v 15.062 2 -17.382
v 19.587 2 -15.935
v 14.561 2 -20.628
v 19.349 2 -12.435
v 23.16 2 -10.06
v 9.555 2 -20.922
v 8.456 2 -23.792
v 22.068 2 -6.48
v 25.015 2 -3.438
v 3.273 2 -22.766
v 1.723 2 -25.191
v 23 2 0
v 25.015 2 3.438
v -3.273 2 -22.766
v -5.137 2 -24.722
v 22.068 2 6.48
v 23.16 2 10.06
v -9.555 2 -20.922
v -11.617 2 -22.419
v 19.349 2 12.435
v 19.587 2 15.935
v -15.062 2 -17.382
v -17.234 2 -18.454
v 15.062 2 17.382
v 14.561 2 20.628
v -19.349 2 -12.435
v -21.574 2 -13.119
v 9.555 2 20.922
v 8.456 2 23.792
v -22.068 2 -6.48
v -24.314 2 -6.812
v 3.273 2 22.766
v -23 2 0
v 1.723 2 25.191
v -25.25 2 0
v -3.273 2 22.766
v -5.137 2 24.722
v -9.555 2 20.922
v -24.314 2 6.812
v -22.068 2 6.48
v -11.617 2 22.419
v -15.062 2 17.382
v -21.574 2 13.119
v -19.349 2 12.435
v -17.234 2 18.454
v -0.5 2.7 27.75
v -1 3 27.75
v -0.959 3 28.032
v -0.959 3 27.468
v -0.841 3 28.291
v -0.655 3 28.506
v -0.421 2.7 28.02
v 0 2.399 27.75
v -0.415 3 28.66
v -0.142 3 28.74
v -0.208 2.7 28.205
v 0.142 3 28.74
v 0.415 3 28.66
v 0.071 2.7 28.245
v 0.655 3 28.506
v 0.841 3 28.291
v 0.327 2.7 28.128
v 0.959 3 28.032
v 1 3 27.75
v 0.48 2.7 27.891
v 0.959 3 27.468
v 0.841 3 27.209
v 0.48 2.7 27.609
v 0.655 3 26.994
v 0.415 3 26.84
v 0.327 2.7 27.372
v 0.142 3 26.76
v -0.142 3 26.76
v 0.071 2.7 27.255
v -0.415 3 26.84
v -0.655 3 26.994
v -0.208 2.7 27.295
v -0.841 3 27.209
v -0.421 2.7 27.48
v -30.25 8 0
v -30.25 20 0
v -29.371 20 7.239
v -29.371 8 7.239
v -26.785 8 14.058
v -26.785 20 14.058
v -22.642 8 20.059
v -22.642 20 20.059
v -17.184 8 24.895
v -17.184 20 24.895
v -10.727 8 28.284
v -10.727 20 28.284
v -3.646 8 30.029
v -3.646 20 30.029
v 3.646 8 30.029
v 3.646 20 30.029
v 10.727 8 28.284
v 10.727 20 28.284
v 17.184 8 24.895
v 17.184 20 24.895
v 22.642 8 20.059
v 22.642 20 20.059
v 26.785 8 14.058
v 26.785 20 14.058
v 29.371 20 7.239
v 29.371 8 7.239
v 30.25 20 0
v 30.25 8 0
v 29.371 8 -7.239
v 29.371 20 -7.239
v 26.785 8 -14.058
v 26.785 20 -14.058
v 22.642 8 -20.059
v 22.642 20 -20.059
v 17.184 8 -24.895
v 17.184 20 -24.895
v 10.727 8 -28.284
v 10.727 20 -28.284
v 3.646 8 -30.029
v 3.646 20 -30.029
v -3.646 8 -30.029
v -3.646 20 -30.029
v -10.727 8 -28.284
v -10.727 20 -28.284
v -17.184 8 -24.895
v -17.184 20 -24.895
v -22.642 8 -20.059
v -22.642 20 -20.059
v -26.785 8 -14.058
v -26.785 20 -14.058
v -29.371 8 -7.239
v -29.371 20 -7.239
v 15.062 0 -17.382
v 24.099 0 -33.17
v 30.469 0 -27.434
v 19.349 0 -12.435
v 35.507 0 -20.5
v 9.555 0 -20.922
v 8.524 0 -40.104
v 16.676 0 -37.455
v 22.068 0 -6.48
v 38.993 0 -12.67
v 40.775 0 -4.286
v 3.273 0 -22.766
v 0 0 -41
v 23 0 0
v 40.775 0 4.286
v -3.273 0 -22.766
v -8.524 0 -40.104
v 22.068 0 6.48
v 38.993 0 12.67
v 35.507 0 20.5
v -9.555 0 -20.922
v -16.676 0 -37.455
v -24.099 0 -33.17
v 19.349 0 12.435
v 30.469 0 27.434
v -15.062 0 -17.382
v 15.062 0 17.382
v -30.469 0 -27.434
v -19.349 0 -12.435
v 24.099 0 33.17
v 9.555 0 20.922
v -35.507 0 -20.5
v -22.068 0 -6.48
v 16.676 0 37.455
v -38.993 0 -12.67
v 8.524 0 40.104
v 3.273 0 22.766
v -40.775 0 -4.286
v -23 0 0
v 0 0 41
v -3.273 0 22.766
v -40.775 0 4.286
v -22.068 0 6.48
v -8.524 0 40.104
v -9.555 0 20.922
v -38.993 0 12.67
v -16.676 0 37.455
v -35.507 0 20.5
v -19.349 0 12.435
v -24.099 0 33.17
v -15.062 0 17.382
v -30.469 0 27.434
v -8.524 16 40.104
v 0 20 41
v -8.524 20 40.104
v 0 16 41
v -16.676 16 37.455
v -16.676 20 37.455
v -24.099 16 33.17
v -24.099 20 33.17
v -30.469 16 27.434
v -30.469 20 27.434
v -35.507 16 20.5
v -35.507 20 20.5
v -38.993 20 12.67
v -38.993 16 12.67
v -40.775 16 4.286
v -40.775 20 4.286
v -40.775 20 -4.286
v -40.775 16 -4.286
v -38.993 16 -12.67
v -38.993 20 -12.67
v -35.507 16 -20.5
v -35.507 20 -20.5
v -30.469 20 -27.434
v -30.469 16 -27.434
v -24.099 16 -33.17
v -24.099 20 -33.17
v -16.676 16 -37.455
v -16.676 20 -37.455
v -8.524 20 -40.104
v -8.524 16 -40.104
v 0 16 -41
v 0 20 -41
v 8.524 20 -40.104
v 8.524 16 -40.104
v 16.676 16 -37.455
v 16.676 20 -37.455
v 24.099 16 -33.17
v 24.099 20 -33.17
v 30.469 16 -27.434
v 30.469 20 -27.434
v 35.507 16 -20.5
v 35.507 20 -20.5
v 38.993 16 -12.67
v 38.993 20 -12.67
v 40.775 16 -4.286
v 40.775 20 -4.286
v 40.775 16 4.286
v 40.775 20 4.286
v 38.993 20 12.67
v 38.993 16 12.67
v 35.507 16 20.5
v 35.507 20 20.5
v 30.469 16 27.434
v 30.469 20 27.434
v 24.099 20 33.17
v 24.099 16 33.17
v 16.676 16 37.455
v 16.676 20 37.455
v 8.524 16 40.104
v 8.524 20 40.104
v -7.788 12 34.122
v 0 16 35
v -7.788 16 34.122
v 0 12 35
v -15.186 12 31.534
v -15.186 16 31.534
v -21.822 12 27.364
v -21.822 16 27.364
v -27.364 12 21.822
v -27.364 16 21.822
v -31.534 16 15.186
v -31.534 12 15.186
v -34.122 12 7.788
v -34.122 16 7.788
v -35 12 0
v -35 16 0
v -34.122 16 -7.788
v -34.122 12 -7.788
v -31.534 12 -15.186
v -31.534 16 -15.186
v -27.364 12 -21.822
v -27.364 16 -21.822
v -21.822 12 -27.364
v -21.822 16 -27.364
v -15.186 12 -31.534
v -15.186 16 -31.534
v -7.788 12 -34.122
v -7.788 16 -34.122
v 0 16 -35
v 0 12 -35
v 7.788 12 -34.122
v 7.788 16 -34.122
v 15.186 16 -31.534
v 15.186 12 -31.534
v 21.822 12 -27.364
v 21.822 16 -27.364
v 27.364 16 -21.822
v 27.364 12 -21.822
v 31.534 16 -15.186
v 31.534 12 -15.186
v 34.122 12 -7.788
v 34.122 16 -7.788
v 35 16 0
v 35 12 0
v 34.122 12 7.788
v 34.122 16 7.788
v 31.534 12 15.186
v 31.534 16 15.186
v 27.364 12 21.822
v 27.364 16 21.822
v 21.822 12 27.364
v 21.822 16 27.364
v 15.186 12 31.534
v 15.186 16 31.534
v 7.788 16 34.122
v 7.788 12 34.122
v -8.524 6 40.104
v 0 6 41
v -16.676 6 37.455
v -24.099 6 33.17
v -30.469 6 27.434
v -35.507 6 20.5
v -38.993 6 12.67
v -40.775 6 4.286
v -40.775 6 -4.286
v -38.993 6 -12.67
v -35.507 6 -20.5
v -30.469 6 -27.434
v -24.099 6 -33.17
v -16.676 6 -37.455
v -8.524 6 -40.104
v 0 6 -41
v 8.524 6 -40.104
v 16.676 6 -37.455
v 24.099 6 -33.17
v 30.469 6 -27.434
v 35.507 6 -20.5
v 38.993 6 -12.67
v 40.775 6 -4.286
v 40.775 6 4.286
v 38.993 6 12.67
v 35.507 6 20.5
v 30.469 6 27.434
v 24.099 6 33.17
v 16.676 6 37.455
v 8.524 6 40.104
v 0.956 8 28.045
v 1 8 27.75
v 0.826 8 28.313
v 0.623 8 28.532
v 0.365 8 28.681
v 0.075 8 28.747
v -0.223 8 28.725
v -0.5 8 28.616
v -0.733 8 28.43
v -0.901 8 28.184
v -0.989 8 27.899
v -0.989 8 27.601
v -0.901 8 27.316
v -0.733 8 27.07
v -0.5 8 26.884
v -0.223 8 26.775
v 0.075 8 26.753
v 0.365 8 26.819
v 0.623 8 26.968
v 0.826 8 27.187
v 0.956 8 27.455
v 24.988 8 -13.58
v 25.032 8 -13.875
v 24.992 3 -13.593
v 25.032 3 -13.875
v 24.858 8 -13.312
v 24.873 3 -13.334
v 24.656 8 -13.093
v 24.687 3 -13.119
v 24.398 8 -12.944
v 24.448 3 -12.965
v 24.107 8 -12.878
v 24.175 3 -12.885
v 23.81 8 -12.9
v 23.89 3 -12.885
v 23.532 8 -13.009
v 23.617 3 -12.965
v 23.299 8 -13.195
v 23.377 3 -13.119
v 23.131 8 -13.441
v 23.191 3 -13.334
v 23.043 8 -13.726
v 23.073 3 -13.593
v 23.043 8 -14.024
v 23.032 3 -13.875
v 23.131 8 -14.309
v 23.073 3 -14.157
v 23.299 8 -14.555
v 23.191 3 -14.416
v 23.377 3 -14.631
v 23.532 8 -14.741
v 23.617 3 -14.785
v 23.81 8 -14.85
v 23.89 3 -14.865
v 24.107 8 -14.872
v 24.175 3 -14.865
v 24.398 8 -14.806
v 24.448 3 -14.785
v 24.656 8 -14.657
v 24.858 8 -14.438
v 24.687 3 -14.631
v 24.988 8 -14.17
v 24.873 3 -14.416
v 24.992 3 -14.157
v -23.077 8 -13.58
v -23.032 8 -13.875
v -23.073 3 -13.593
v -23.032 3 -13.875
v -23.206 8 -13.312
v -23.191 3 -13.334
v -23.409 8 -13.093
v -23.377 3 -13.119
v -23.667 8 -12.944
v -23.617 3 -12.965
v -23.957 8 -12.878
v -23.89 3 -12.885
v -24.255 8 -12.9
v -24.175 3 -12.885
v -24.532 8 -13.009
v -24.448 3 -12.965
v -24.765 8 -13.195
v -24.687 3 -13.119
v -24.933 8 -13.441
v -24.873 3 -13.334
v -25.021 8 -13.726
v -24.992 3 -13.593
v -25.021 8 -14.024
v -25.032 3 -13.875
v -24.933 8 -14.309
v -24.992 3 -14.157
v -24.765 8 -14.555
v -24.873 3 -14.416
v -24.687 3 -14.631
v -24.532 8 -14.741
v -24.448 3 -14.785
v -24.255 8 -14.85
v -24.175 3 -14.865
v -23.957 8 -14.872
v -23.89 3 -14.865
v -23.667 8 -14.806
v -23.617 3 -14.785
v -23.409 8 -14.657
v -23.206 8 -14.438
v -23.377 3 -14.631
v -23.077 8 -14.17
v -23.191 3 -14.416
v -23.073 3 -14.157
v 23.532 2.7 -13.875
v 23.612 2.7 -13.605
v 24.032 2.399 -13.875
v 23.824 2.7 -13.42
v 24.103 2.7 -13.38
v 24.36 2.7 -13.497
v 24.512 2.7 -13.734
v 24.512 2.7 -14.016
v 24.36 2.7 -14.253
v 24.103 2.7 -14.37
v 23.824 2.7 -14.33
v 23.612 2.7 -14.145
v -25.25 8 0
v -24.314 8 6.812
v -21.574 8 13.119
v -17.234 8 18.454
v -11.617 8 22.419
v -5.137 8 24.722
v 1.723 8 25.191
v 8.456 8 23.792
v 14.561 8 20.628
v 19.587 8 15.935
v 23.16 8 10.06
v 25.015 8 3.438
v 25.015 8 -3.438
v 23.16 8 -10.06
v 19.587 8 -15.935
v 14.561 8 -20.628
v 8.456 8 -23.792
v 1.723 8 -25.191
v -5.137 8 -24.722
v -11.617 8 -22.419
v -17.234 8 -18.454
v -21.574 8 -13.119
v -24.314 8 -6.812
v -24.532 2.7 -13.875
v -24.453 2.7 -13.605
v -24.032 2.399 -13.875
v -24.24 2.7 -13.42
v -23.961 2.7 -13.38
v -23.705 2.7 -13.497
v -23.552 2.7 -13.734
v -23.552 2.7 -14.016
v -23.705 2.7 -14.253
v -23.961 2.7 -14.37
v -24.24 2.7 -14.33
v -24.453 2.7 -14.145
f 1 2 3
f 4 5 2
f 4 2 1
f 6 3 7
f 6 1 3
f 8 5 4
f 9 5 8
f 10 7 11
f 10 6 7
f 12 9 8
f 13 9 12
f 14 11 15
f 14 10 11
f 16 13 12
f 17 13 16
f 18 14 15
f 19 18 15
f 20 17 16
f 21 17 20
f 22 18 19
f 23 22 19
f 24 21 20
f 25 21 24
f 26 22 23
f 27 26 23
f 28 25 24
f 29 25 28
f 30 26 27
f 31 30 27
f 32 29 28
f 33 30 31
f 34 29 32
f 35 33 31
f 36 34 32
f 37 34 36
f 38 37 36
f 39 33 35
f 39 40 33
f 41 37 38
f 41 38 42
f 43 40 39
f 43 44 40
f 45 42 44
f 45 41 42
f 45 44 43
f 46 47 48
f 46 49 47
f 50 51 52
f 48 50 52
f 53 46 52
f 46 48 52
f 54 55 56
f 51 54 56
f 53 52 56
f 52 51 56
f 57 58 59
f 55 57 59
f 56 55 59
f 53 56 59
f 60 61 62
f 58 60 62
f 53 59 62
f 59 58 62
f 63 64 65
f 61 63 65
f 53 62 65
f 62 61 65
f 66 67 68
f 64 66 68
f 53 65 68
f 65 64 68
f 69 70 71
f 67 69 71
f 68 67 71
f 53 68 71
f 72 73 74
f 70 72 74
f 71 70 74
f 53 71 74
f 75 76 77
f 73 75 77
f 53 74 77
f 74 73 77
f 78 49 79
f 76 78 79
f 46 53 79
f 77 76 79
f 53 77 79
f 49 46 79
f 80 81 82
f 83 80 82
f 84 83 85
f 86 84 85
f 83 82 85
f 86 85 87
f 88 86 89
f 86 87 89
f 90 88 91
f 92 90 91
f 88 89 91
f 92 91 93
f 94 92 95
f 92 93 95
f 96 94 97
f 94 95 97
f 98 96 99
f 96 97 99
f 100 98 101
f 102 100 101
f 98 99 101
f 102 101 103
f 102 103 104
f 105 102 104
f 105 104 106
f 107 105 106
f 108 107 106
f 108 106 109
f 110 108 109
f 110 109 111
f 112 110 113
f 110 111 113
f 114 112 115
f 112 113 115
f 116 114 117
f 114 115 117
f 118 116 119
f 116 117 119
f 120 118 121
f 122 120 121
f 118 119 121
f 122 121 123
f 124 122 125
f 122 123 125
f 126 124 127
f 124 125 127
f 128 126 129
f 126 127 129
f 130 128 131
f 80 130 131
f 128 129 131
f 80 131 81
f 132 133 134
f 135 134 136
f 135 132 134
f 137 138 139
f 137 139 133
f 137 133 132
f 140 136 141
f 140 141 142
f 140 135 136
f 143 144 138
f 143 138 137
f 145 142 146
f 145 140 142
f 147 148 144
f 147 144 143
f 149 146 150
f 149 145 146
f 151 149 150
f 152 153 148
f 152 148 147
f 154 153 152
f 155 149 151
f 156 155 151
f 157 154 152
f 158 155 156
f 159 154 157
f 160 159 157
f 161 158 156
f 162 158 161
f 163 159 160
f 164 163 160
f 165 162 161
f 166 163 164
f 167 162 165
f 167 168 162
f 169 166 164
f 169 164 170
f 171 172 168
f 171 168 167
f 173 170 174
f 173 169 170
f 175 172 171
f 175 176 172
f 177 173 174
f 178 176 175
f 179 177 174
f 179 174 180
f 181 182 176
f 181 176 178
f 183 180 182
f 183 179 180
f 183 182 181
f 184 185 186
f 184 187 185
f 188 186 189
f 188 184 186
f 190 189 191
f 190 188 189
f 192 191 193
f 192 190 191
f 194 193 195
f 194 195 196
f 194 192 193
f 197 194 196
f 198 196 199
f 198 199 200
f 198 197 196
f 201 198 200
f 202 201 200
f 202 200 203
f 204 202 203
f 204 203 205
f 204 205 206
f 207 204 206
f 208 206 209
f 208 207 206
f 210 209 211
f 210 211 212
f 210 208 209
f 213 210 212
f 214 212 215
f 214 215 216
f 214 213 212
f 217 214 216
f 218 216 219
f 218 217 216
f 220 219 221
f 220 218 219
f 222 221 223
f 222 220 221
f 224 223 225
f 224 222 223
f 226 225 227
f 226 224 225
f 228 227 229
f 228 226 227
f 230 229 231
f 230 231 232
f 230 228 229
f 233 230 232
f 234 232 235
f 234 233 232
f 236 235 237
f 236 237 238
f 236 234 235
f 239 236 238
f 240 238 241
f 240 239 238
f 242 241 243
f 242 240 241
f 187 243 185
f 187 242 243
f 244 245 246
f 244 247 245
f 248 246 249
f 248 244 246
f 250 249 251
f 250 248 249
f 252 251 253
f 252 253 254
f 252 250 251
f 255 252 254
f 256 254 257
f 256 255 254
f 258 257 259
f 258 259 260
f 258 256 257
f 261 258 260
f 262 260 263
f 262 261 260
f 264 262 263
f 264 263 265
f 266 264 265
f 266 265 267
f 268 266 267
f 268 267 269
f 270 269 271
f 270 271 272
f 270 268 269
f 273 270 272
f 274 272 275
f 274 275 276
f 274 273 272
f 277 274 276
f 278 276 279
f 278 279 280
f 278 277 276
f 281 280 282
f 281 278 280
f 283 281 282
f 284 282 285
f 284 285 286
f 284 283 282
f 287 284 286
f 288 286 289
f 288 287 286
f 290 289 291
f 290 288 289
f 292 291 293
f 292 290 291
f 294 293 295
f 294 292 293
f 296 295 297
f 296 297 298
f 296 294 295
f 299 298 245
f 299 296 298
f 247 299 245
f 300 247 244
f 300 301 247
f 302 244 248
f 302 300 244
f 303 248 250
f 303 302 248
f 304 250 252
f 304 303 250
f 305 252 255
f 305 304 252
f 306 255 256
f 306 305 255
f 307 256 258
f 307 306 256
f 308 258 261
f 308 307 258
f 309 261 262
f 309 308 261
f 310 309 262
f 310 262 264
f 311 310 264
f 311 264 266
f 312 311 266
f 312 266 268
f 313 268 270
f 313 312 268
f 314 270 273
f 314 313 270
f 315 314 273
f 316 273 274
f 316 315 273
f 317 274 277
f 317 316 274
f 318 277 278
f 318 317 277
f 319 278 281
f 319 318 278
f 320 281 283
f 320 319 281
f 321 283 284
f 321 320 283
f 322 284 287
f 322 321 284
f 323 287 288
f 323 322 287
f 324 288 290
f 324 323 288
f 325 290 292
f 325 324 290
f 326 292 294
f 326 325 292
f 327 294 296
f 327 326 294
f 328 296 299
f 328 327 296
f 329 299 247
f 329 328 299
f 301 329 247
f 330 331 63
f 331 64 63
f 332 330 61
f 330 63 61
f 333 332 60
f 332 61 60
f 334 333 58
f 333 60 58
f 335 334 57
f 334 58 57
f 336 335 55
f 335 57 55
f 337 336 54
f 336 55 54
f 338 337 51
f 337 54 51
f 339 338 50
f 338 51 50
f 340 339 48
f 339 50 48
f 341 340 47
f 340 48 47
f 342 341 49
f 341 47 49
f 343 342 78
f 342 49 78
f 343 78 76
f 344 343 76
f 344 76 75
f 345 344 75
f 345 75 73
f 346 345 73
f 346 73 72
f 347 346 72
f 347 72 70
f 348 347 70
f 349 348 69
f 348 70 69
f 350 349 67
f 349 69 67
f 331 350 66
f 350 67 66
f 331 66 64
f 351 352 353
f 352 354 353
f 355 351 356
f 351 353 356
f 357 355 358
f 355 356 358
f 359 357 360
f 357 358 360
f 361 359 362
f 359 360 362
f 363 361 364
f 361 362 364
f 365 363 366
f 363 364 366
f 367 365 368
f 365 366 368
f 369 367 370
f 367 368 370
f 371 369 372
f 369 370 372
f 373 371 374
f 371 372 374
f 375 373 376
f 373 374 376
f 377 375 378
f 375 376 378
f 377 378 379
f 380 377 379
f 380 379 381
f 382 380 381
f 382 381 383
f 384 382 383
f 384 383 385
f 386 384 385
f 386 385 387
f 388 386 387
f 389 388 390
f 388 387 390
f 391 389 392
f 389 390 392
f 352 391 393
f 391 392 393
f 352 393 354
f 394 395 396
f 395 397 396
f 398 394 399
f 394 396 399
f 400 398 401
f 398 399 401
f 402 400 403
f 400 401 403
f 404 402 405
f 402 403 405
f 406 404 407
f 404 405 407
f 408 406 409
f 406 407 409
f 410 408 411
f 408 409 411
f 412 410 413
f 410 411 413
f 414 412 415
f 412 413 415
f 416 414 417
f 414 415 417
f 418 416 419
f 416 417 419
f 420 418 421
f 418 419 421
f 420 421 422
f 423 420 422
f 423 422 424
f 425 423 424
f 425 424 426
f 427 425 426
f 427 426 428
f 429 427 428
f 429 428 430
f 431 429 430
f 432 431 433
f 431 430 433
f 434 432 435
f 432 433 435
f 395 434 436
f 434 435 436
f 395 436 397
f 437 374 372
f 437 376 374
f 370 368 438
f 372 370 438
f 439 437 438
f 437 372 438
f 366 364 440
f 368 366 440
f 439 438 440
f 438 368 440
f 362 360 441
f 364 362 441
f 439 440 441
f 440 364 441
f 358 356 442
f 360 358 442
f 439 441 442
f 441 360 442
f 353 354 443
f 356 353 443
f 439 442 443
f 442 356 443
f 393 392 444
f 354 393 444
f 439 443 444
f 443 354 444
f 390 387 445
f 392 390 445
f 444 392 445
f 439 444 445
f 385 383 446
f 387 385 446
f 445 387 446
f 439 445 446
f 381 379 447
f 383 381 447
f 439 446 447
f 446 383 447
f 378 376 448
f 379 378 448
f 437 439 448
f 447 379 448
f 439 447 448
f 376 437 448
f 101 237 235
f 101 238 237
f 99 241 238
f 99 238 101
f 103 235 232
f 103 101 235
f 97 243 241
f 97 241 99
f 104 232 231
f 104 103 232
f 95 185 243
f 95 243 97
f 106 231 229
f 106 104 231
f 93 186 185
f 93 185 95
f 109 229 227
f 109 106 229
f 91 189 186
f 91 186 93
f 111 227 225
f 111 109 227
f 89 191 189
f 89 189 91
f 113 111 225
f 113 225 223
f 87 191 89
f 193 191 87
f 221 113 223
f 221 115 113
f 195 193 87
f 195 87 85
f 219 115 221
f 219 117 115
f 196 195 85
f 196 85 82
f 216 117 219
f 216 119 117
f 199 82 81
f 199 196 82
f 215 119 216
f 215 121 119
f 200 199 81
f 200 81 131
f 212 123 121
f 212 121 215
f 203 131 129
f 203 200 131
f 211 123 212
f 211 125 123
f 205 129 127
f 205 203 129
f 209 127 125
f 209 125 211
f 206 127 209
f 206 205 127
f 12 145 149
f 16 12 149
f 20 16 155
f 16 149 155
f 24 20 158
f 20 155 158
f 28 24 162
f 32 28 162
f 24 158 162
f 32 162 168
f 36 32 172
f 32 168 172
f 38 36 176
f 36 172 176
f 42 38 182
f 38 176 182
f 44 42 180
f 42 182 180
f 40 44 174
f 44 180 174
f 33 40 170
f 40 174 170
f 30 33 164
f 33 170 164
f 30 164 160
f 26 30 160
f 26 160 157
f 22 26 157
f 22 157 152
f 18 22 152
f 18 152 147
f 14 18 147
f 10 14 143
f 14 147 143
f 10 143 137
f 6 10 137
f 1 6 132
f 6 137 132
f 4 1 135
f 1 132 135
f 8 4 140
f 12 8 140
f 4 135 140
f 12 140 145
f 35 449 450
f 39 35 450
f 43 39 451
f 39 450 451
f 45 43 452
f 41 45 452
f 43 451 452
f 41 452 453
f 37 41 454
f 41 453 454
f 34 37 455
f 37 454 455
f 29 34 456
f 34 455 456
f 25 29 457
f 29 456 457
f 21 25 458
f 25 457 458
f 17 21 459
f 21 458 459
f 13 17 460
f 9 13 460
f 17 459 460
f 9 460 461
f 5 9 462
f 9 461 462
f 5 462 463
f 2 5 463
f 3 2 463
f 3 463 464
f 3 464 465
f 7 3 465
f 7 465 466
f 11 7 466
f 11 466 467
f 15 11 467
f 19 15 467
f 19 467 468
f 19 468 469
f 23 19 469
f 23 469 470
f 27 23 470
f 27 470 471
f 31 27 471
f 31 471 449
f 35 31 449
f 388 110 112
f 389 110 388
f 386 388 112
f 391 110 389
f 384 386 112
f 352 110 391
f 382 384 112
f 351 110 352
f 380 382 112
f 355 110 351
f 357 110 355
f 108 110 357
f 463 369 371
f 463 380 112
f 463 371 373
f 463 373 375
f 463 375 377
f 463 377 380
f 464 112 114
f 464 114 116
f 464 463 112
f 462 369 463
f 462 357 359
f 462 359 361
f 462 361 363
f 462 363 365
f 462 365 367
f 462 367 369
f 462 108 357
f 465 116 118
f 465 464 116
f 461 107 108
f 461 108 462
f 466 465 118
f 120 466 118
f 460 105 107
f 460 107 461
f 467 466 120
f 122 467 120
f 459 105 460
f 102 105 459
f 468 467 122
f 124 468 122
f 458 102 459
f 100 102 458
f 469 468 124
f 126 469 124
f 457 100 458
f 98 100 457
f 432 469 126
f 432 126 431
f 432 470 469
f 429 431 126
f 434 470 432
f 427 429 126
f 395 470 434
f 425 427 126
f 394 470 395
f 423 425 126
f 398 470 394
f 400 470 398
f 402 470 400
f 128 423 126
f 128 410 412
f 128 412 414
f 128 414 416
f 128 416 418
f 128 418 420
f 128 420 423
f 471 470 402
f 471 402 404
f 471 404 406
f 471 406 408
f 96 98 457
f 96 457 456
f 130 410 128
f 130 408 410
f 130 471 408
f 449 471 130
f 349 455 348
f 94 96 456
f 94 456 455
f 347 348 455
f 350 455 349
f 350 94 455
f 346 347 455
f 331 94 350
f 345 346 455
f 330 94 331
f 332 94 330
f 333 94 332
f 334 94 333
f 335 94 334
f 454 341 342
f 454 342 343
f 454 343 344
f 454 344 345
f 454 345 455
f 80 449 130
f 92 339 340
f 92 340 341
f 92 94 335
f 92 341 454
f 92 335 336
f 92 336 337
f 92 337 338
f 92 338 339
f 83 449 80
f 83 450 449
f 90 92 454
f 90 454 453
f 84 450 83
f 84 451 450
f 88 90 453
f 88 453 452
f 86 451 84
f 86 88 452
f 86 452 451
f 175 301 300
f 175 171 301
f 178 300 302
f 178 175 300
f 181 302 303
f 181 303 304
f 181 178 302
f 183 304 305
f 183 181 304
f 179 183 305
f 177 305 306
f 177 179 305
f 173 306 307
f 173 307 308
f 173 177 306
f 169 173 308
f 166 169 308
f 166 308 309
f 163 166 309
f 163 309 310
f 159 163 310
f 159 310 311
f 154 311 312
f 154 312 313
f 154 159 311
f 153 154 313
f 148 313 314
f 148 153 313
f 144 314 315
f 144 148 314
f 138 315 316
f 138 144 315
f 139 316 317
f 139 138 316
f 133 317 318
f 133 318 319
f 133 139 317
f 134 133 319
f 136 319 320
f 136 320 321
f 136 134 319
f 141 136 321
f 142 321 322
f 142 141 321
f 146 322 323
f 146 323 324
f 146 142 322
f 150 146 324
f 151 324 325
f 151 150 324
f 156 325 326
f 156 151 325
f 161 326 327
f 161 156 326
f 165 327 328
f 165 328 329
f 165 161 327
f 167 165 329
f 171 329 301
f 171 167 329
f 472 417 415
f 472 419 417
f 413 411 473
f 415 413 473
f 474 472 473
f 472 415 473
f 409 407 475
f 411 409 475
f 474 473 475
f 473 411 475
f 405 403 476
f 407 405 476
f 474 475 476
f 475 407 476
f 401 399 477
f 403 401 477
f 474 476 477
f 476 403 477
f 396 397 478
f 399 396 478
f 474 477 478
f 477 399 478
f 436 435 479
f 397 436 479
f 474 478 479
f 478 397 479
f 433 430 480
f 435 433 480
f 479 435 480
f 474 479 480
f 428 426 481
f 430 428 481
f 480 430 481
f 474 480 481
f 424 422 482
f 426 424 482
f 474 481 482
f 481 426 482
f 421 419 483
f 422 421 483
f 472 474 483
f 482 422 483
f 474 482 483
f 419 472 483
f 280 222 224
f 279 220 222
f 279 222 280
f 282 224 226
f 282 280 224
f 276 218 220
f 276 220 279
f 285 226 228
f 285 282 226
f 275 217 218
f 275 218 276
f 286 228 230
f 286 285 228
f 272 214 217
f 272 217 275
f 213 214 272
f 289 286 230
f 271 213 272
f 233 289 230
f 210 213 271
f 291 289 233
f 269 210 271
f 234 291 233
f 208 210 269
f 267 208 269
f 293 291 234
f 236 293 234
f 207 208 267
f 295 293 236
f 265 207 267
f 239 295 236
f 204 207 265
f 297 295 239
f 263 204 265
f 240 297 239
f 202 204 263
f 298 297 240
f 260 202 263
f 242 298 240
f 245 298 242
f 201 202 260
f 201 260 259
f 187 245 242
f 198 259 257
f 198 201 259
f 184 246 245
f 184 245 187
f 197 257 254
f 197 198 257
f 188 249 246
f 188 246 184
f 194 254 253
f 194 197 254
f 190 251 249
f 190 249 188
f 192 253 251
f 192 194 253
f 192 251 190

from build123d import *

# Parameters (mm, degrees)
F2_R     = 25.25
F3_DEPTH = 18
F4_R     = 23
F5_DEPTH = 2
F6_R     = 30.25
F6_R_2   = 25.25
F7_DEPTH = 12
F9_D     = 2
F9_DEPTH = 5
F9_TIP   = 0.600860619


with BuildPart() as f1:
    # F0 (on Right) → F1 (revolve)
    with BuildSketch(Plane.YZ):
        Polygon((0, 41), (0, 0), (20, 0), (20, 41), (16, 41), (16, 35), (12, 35), (6, 41), align=None)
    revolve(axis=Axis((0, 10, 0), (0, -1, 0)))

    # F2 (on face) → F3 (cut)
    with BuildSketch(Plane(origin=(0, 20, 0), x_dir=(-1, 0, 0), z_dir=(0, 1, 0))):
        Circle(F2_R)
    extrude(amount=-F3_DEPTH, mode=Mode.SUBTRACT)

    # F4 (on face) → F5 (cut, through all)
    with BuildSketch(Plane.XZ):
        Circle(F4_R)
    extrude(amount=-F5_DEPTH, mode=Mode.SUBTRACT)

    # F6 (on face) → F7 (cut)
    with BuildSketch(Plane(origin=(0, 20, 0), x_dir=(-1, 0, 0), z_dir=(0, 1, 0))):
        Circle(F6_R)
        Circle(F6_R_2, mode=Mode.SUBTRACT)
    extrude(amount=-F7_DEPTH, mode=Mode.SUBTRACT)

    # F9
    with Locations(Plane(origin=(0, 8, 0), x_dir=(-1, 0, 0), z_dir=(0, 1, 0))):
        with Locations((0, 27.75), (24.032204955, -13.875), (-24.032204955, -13.875)):
            Hole(F9_D / 2, depth=F9_DEPTH)
            with Locations((0, 0, -(F9_DEPTH + F9_TIP / 2))):  # 118° drill point
                Cone(0, F9_D / 2, F9_TIP, mode=Mode.SUBTRACT)


solid = f1.part
